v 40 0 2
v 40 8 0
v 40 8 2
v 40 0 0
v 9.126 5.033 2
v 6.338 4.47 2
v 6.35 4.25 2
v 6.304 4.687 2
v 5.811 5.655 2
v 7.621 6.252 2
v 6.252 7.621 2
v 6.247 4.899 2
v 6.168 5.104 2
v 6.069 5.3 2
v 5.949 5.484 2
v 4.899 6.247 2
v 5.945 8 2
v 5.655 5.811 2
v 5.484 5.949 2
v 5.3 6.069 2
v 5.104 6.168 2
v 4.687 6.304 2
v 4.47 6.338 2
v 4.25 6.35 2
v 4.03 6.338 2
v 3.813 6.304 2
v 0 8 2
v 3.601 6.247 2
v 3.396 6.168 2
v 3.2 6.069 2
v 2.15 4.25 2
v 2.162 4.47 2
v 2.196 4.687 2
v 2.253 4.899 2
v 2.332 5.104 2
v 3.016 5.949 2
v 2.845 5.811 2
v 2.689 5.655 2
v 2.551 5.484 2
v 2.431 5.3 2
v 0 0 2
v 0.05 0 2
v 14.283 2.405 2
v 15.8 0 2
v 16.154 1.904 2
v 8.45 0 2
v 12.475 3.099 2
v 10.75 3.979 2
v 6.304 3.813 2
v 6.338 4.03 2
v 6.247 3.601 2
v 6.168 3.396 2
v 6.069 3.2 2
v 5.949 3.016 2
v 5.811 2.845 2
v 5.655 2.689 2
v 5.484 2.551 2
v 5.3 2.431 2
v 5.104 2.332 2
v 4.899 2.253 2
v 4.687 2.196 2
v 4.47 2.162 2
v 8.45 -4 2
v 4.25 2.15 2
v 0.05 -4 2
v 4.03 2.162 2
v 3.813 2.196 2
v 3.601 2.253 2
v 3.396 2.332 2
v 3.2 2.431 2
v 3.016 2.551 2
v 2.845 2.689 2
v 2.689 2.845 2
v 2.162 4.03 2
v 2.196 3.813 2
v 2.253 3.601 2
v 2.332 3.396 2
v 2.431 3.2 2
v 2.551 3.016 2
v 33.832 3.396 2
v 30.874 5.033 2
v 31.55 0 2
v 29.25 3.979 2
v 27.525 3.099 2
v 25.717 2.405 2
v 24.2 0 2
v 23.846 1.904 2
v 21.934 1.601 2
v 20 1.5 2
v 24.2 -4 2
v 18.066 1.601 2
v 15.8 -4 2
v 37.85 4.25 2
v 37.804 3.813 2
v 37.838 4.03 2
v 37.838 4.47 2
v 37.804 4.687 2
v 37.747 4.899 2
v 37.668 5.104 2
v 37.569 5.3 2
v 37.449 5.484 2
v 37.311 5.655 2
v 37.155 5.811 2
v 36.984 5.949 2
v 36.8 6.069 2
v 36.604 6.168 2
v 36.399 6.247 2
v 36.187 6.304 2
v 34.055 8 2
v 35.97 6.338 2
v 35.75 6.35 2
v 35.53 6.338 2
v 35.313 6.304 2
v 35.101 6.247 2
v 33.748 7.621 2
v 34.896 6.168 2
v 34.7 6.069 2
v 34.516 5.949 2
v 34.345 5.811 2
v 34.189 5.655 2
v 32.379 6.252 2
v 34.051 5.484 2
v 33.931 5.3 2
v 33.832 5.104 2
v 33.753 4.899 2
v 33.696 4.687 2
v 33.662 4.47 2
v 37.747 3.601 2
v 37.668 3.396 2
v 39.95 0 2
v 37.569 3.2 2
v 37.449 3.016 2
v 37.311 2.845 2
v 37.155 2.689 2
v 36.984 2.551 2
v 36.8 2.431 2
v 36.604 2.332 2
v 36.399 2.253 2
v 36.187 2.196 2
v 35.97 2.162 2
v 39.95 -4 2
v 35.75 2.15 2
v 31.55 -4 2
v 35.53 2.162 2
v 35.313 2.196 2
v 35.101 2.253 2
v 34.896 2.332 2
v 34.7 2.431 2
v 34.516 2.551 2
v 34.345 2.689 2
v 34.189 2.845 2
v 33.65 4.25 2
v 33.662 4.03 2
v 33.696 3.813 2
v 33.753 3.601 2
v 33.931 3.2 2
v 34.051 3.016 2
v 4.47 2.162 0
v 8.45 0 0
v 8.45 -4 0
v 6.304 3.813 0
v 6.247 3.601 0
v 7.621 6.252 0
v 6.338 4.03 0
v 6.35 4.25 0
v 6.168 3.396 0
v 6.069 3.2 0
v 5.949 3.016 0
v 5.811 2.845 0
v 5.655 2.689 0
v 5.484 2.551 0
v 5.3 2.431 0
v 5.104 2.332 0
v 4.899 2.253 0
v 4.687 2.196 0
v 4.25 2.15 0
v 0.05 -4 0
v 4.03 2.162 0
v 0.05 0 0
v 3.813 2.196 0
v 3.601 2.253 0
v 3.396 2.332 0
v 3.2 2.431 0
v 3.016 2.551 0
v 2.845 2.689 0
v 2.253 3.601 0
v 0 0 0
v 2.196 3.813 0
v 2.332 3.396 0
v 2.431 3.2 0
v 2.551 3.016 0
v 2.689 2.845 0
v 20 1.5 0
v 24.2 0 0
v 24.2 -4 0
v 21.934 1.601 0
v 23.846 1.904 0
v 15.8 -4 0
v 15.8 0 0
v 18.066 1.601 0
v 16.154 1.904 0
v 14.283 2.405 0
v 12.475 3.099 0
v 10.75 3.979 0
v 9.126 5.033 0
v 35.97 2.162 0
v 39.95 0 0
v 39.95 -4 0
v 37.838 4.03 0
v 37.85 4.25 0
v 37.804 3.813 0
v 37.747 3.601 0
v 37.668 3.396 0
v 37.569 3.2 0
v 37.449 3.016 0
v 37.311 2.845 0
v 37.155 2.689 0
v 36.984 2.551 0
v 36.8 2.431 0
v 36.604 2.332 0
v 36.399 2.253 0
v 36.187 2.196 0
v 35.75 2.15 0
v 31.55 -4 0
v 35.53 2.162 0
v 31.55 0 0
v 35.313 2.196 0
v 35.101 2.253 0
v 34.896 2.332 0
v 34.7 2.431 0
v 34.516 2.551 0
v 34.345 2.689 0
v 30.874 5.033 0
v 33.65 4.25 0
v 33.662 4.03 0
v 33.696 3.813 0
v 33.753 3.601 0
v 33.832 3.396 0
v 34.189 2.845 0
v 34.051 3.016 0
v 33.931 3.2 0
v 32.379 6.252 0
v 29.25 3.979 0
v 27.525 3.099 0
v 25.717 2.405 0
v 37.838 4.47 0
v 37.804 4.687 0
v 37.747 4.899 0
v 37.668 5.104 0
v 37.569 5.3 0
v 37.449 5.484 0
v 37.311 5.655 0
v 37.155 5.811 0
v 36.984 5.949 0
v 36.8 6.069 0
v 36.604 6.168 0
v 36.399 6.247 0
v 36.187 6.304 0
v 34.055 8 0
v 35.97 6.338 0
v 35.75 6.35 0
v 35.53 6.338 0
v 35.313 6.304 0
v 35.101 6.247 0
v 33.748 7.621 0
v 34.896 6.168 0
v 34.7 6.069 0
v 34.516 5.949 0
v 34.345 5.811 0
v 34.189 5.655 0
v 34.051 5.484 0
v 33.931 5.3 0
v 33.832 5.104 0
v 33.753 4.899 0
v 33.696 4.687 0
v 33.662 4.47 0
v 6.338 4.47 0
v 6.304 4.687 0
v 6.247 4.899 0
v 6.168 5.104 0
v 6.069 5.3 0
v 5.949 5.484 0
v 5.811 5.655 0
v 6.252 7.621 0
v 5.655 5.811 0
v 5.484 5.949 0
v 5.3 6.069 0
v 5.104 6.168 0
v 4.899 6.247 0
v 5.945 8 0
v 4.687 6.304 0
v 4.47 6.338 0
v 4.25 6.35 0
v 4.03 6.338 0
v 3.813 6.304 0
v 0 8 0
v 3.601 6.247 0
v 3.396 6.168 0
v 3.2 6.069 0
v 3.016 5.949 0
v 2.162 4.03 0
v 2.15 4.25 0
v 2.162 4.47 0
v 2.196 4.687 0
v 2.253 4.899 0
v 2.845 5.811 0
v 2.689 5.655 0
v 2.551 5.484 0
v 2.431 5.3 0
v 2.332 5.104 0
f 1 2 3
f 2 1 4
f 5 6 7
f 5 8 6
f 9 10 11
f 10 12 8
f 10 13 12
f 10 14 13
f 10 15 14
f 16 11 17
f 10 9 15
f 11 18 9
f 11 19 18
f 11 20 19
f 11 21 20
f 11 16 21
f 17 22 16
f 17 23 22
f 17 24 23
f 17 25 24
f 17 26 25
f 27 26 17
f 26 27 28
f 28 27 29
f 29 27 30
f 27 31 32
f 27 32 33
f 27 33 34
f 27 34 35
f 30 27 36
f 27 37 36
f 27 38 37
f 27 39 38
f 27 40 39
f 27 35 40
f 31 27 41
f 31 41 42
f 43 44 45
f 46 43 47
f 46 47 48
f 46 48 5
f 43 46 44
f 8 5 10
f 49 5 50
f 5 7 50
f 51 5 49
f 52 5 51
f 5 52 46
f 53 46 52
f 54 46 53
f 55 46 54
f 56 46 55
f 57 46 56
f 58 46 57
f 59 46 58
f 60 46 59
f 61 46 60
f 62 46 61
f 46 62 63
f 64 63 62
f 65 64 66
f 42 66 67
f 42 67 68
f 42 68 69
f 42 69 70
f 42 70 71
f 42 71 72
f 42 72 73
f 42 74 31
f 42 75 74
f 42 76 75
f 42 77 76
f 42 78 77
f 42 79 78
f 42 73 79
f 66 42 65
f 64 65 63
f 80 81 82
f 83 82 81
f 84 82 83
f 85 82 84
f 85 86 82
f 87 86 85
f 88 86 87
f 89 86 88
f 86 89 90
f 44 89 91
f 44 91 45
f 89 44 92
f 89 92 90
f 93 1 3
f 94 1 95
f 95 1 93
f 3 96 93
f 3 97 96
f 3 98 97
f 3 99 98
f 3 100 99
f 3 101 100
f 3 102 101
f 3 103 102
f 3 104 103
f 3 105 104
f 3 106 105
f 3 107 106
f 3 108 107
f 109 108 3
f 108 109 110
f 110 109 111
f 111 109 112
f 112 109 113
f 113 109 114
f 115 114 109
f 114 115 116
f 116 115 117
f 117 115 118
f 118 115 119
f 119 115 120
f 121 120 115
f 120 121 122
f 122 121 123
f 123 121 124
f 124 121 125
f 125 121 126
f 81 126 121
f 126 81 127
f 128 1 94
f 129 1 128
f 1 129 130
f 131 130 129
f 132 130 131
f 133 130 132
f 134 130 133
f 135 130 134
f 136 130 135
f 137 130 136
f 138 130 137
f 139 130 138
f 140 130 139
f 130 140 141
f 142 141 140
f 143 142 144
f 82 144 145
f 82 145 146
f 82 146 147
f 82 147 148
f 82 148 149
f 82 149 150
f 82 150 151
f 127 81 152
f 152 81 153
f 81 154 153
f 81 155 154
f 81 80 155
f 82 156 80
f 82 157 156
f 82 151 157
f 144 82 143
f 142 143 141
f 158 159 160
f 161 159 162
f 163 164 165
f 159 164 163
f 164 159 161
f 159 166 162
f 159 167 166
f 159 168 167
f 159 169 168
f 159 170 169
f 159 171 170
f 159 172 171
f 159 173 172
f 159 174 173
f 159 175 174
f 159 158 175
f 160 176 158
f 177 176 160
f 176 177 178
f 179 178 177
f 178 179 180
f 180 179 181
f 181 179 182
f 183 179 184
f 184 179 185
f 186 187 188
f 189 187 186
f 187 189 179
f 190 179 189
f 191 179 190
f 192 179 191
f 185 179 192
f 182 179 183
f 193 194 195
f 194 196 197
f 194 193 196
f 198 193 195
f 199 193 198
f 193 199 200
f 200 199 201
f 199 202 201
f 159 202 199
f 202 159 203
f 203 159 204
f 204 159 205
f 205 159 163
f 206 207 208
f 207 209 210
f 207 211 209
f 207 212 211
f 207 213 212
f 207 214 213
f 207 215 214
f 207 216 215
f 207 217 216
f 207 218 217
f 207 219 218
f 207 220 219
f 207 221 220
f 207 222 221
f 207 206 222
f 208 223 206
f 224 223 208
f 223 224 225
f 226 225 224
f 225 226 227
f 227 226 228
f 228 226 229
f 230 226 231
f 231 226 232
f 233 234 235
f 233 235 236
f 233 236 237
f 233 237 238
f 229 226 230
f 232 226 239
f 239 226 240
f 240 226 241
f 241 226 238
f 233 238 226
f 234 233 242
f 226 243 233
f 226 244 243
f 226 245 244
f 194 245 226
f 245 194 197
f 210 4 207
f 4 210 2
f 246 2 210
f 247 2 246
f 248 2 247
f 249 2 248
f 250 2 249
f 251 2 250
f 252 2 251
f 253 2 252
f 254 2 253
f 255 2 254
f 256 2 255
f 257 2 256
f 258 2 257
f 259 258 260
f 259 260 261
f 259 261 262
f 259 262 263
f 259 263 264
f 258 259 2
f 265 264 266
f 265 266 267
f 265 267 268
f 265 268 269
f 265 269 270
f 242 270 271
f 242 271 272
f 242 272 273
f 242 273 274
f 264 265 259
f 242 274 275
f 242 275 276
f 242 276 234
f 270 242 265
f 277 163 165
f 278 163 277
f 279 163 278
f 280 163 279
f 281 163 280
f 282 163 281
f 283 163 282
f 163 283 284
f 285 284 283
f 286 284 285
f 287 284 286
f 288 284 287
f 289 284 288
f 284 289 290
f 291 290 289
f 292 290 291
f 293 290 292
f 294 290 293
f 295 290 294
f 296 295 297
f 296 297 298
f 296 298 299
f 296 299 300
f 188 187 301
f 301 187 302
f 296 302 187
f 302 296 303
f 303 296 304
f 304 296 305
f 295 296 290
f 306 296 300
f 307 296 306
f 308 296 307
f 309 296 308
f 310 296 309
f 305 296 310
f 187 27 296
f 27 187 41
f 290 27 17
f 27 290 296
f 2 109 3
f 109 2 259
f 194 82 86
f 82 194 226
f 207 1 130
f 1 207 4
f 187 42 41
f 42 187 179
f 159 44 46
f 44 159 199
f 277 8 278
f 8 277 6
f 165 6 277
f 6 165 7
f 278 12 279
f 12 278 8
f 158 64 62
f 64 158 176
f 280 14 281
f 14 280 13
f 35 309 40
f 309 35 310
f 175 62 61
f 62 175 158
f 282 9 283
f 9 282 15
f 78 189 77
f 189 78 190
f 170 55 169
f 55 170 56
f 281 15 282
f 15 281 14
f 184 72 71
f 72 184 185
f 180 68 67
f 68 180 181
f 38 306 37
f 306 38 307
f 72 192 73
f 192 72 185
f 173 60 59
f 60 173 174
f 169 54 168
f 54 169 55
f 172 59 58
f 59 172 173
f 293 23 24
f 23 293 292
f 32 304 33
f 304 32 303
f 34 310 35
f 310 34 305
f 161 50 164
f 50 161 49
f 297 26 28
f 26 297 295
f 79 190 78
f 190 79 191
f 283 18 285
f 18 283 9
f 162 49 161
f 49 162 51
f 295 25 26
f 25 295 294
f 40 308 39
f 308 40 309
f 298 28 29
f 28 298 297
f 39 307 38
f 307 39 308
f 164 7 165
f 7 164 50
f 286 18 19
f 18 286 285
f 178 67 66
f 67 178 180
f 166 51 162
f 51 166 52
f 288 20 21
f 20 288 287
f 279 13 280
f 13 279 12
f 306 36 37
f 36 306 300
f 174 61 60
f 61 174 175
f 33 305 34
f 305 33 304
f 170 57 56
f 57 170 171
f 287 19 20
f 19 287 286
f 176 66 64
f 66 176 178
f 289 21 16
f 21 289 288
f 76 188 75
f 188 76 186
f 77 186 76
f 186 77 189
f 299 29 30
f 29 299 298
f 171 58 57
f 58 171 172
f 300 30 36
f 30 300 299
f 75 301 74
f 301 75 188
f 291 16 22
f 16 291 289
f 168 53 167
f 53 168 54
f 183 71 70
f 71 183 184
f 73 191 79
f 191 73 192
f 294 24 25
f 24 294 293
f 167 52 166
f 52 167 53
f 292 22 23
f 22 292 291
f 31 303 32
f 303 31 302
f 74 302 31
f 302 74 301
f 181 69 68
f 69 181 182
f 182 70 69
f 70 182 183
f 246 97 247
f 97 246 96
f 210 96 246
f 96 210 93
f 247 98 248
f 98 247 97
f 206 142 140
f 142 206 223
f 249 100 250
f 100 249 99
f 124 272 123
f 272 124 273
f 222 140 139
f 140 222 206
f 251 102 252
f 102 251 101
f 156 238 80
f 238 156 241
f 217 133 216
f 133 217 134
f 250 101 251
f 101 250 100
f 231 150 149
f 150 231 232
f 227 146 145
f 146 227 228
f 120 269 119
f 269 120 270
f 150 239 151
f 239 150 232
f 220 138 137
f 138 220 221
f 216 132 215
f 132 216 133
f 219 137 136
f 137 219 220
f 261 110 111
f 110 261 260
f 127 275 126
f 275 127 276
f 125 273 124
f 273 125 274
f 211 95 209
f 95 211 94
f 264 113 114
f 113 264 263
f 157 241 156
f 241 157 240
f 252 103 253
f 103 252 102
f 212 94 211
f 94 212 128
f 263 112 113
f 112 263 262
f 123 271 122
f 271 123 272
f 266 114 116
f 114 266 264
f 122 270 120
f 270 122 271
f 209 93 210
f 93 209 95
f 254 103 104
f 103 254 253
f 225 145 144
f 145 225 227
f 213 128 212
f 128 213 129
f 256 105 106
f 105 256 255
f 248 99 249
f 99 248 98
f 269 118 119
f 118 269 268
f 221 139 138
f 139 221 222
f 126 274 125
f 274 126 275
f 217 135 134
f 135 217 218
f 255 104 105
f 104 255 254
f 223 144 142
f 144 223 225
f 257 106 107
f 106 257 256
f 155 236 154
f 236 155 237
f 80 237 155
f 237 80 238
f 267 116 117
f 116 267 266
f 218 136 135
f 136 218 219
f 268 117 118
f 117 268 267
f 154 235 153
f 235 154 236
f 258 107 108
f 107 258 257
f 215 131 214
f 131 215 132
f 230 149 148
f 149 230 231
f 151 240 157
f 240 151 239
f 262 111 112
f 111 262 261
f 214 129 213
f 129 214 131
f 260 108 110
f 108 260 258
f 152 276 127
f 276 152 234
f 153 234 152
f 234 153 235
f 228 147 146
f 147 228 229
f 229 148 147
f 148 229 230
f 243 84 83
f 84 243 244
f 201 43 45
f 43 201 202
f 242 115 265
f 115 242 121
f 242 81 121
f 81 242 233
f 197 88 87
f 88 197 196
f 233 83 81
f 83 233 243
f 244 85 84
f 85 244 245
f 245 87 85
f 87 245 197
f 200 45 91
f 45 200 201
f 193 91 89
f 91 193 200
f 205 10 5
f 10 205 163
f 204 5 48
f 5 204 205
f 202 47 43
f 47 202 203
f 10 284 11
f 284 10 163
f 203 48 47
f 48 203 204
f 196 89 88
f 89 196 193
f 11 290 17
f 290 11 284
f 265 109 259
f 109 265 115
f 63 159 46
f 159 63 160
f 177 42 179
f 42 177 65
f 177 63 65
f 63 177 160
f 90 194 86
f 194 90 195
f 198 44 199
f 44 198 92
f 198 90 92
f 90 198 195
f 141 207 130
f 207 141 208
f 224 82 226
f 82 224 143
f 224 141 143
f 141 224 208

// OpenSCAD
// Fan bracket for Small Brushless DC Fan
// Dimensions:
// H x W x D = 40 x 40 x 20.2mm
// Hole raster 31.5 x 31.5mm
// 
// For mounting on a flat surface using brackets on either side
// Two brackets must be printed
//
// Version 0.1

$fn=60;

W=40; // Width (equals height)
Drotor=37; // Fan in- outlet diameter 37mm
hole=4.2; // Mounting holes
grid=31.5; // Mounting hole grid
depth=20.5; // Fan depth

Hbr=8; //Bracket height
Tbr=2; //Bracket thickness
Hbp=2*Tbr; //Base plate height

//Shape to match fan dimensions
difference(){
cube ([W,Hbr,Tbr]);
translate(v=[(W/2)-(grid/2),(W/2)-(grid/2),0]){ cylinder(h=Tbr, d=hole); }
translate(v=[(W/2)+(grid/2),(W/2)-(grid/2),0]){ cylinder(h=Tbr, d=hole); }
translate(v=[(W/2), W/2,0]){ cylinder(h=Tbr, d=Drotor); }
}

//Slots to snap into base plate
translate(v=[(W/2)-(grid/2)-hole,-Hbp,0]){cube ([hole*2,Hbp,Tbr]);}
translate(v=[(W/2)-hole,-Hbp,0]){cube ([hole*2,Hbp,Tbr]);}
translate(v=[(W/2)+(grid/2)-hole,-Hbp,0]){cube ([hole*2,Hbp,Tbr]);}
